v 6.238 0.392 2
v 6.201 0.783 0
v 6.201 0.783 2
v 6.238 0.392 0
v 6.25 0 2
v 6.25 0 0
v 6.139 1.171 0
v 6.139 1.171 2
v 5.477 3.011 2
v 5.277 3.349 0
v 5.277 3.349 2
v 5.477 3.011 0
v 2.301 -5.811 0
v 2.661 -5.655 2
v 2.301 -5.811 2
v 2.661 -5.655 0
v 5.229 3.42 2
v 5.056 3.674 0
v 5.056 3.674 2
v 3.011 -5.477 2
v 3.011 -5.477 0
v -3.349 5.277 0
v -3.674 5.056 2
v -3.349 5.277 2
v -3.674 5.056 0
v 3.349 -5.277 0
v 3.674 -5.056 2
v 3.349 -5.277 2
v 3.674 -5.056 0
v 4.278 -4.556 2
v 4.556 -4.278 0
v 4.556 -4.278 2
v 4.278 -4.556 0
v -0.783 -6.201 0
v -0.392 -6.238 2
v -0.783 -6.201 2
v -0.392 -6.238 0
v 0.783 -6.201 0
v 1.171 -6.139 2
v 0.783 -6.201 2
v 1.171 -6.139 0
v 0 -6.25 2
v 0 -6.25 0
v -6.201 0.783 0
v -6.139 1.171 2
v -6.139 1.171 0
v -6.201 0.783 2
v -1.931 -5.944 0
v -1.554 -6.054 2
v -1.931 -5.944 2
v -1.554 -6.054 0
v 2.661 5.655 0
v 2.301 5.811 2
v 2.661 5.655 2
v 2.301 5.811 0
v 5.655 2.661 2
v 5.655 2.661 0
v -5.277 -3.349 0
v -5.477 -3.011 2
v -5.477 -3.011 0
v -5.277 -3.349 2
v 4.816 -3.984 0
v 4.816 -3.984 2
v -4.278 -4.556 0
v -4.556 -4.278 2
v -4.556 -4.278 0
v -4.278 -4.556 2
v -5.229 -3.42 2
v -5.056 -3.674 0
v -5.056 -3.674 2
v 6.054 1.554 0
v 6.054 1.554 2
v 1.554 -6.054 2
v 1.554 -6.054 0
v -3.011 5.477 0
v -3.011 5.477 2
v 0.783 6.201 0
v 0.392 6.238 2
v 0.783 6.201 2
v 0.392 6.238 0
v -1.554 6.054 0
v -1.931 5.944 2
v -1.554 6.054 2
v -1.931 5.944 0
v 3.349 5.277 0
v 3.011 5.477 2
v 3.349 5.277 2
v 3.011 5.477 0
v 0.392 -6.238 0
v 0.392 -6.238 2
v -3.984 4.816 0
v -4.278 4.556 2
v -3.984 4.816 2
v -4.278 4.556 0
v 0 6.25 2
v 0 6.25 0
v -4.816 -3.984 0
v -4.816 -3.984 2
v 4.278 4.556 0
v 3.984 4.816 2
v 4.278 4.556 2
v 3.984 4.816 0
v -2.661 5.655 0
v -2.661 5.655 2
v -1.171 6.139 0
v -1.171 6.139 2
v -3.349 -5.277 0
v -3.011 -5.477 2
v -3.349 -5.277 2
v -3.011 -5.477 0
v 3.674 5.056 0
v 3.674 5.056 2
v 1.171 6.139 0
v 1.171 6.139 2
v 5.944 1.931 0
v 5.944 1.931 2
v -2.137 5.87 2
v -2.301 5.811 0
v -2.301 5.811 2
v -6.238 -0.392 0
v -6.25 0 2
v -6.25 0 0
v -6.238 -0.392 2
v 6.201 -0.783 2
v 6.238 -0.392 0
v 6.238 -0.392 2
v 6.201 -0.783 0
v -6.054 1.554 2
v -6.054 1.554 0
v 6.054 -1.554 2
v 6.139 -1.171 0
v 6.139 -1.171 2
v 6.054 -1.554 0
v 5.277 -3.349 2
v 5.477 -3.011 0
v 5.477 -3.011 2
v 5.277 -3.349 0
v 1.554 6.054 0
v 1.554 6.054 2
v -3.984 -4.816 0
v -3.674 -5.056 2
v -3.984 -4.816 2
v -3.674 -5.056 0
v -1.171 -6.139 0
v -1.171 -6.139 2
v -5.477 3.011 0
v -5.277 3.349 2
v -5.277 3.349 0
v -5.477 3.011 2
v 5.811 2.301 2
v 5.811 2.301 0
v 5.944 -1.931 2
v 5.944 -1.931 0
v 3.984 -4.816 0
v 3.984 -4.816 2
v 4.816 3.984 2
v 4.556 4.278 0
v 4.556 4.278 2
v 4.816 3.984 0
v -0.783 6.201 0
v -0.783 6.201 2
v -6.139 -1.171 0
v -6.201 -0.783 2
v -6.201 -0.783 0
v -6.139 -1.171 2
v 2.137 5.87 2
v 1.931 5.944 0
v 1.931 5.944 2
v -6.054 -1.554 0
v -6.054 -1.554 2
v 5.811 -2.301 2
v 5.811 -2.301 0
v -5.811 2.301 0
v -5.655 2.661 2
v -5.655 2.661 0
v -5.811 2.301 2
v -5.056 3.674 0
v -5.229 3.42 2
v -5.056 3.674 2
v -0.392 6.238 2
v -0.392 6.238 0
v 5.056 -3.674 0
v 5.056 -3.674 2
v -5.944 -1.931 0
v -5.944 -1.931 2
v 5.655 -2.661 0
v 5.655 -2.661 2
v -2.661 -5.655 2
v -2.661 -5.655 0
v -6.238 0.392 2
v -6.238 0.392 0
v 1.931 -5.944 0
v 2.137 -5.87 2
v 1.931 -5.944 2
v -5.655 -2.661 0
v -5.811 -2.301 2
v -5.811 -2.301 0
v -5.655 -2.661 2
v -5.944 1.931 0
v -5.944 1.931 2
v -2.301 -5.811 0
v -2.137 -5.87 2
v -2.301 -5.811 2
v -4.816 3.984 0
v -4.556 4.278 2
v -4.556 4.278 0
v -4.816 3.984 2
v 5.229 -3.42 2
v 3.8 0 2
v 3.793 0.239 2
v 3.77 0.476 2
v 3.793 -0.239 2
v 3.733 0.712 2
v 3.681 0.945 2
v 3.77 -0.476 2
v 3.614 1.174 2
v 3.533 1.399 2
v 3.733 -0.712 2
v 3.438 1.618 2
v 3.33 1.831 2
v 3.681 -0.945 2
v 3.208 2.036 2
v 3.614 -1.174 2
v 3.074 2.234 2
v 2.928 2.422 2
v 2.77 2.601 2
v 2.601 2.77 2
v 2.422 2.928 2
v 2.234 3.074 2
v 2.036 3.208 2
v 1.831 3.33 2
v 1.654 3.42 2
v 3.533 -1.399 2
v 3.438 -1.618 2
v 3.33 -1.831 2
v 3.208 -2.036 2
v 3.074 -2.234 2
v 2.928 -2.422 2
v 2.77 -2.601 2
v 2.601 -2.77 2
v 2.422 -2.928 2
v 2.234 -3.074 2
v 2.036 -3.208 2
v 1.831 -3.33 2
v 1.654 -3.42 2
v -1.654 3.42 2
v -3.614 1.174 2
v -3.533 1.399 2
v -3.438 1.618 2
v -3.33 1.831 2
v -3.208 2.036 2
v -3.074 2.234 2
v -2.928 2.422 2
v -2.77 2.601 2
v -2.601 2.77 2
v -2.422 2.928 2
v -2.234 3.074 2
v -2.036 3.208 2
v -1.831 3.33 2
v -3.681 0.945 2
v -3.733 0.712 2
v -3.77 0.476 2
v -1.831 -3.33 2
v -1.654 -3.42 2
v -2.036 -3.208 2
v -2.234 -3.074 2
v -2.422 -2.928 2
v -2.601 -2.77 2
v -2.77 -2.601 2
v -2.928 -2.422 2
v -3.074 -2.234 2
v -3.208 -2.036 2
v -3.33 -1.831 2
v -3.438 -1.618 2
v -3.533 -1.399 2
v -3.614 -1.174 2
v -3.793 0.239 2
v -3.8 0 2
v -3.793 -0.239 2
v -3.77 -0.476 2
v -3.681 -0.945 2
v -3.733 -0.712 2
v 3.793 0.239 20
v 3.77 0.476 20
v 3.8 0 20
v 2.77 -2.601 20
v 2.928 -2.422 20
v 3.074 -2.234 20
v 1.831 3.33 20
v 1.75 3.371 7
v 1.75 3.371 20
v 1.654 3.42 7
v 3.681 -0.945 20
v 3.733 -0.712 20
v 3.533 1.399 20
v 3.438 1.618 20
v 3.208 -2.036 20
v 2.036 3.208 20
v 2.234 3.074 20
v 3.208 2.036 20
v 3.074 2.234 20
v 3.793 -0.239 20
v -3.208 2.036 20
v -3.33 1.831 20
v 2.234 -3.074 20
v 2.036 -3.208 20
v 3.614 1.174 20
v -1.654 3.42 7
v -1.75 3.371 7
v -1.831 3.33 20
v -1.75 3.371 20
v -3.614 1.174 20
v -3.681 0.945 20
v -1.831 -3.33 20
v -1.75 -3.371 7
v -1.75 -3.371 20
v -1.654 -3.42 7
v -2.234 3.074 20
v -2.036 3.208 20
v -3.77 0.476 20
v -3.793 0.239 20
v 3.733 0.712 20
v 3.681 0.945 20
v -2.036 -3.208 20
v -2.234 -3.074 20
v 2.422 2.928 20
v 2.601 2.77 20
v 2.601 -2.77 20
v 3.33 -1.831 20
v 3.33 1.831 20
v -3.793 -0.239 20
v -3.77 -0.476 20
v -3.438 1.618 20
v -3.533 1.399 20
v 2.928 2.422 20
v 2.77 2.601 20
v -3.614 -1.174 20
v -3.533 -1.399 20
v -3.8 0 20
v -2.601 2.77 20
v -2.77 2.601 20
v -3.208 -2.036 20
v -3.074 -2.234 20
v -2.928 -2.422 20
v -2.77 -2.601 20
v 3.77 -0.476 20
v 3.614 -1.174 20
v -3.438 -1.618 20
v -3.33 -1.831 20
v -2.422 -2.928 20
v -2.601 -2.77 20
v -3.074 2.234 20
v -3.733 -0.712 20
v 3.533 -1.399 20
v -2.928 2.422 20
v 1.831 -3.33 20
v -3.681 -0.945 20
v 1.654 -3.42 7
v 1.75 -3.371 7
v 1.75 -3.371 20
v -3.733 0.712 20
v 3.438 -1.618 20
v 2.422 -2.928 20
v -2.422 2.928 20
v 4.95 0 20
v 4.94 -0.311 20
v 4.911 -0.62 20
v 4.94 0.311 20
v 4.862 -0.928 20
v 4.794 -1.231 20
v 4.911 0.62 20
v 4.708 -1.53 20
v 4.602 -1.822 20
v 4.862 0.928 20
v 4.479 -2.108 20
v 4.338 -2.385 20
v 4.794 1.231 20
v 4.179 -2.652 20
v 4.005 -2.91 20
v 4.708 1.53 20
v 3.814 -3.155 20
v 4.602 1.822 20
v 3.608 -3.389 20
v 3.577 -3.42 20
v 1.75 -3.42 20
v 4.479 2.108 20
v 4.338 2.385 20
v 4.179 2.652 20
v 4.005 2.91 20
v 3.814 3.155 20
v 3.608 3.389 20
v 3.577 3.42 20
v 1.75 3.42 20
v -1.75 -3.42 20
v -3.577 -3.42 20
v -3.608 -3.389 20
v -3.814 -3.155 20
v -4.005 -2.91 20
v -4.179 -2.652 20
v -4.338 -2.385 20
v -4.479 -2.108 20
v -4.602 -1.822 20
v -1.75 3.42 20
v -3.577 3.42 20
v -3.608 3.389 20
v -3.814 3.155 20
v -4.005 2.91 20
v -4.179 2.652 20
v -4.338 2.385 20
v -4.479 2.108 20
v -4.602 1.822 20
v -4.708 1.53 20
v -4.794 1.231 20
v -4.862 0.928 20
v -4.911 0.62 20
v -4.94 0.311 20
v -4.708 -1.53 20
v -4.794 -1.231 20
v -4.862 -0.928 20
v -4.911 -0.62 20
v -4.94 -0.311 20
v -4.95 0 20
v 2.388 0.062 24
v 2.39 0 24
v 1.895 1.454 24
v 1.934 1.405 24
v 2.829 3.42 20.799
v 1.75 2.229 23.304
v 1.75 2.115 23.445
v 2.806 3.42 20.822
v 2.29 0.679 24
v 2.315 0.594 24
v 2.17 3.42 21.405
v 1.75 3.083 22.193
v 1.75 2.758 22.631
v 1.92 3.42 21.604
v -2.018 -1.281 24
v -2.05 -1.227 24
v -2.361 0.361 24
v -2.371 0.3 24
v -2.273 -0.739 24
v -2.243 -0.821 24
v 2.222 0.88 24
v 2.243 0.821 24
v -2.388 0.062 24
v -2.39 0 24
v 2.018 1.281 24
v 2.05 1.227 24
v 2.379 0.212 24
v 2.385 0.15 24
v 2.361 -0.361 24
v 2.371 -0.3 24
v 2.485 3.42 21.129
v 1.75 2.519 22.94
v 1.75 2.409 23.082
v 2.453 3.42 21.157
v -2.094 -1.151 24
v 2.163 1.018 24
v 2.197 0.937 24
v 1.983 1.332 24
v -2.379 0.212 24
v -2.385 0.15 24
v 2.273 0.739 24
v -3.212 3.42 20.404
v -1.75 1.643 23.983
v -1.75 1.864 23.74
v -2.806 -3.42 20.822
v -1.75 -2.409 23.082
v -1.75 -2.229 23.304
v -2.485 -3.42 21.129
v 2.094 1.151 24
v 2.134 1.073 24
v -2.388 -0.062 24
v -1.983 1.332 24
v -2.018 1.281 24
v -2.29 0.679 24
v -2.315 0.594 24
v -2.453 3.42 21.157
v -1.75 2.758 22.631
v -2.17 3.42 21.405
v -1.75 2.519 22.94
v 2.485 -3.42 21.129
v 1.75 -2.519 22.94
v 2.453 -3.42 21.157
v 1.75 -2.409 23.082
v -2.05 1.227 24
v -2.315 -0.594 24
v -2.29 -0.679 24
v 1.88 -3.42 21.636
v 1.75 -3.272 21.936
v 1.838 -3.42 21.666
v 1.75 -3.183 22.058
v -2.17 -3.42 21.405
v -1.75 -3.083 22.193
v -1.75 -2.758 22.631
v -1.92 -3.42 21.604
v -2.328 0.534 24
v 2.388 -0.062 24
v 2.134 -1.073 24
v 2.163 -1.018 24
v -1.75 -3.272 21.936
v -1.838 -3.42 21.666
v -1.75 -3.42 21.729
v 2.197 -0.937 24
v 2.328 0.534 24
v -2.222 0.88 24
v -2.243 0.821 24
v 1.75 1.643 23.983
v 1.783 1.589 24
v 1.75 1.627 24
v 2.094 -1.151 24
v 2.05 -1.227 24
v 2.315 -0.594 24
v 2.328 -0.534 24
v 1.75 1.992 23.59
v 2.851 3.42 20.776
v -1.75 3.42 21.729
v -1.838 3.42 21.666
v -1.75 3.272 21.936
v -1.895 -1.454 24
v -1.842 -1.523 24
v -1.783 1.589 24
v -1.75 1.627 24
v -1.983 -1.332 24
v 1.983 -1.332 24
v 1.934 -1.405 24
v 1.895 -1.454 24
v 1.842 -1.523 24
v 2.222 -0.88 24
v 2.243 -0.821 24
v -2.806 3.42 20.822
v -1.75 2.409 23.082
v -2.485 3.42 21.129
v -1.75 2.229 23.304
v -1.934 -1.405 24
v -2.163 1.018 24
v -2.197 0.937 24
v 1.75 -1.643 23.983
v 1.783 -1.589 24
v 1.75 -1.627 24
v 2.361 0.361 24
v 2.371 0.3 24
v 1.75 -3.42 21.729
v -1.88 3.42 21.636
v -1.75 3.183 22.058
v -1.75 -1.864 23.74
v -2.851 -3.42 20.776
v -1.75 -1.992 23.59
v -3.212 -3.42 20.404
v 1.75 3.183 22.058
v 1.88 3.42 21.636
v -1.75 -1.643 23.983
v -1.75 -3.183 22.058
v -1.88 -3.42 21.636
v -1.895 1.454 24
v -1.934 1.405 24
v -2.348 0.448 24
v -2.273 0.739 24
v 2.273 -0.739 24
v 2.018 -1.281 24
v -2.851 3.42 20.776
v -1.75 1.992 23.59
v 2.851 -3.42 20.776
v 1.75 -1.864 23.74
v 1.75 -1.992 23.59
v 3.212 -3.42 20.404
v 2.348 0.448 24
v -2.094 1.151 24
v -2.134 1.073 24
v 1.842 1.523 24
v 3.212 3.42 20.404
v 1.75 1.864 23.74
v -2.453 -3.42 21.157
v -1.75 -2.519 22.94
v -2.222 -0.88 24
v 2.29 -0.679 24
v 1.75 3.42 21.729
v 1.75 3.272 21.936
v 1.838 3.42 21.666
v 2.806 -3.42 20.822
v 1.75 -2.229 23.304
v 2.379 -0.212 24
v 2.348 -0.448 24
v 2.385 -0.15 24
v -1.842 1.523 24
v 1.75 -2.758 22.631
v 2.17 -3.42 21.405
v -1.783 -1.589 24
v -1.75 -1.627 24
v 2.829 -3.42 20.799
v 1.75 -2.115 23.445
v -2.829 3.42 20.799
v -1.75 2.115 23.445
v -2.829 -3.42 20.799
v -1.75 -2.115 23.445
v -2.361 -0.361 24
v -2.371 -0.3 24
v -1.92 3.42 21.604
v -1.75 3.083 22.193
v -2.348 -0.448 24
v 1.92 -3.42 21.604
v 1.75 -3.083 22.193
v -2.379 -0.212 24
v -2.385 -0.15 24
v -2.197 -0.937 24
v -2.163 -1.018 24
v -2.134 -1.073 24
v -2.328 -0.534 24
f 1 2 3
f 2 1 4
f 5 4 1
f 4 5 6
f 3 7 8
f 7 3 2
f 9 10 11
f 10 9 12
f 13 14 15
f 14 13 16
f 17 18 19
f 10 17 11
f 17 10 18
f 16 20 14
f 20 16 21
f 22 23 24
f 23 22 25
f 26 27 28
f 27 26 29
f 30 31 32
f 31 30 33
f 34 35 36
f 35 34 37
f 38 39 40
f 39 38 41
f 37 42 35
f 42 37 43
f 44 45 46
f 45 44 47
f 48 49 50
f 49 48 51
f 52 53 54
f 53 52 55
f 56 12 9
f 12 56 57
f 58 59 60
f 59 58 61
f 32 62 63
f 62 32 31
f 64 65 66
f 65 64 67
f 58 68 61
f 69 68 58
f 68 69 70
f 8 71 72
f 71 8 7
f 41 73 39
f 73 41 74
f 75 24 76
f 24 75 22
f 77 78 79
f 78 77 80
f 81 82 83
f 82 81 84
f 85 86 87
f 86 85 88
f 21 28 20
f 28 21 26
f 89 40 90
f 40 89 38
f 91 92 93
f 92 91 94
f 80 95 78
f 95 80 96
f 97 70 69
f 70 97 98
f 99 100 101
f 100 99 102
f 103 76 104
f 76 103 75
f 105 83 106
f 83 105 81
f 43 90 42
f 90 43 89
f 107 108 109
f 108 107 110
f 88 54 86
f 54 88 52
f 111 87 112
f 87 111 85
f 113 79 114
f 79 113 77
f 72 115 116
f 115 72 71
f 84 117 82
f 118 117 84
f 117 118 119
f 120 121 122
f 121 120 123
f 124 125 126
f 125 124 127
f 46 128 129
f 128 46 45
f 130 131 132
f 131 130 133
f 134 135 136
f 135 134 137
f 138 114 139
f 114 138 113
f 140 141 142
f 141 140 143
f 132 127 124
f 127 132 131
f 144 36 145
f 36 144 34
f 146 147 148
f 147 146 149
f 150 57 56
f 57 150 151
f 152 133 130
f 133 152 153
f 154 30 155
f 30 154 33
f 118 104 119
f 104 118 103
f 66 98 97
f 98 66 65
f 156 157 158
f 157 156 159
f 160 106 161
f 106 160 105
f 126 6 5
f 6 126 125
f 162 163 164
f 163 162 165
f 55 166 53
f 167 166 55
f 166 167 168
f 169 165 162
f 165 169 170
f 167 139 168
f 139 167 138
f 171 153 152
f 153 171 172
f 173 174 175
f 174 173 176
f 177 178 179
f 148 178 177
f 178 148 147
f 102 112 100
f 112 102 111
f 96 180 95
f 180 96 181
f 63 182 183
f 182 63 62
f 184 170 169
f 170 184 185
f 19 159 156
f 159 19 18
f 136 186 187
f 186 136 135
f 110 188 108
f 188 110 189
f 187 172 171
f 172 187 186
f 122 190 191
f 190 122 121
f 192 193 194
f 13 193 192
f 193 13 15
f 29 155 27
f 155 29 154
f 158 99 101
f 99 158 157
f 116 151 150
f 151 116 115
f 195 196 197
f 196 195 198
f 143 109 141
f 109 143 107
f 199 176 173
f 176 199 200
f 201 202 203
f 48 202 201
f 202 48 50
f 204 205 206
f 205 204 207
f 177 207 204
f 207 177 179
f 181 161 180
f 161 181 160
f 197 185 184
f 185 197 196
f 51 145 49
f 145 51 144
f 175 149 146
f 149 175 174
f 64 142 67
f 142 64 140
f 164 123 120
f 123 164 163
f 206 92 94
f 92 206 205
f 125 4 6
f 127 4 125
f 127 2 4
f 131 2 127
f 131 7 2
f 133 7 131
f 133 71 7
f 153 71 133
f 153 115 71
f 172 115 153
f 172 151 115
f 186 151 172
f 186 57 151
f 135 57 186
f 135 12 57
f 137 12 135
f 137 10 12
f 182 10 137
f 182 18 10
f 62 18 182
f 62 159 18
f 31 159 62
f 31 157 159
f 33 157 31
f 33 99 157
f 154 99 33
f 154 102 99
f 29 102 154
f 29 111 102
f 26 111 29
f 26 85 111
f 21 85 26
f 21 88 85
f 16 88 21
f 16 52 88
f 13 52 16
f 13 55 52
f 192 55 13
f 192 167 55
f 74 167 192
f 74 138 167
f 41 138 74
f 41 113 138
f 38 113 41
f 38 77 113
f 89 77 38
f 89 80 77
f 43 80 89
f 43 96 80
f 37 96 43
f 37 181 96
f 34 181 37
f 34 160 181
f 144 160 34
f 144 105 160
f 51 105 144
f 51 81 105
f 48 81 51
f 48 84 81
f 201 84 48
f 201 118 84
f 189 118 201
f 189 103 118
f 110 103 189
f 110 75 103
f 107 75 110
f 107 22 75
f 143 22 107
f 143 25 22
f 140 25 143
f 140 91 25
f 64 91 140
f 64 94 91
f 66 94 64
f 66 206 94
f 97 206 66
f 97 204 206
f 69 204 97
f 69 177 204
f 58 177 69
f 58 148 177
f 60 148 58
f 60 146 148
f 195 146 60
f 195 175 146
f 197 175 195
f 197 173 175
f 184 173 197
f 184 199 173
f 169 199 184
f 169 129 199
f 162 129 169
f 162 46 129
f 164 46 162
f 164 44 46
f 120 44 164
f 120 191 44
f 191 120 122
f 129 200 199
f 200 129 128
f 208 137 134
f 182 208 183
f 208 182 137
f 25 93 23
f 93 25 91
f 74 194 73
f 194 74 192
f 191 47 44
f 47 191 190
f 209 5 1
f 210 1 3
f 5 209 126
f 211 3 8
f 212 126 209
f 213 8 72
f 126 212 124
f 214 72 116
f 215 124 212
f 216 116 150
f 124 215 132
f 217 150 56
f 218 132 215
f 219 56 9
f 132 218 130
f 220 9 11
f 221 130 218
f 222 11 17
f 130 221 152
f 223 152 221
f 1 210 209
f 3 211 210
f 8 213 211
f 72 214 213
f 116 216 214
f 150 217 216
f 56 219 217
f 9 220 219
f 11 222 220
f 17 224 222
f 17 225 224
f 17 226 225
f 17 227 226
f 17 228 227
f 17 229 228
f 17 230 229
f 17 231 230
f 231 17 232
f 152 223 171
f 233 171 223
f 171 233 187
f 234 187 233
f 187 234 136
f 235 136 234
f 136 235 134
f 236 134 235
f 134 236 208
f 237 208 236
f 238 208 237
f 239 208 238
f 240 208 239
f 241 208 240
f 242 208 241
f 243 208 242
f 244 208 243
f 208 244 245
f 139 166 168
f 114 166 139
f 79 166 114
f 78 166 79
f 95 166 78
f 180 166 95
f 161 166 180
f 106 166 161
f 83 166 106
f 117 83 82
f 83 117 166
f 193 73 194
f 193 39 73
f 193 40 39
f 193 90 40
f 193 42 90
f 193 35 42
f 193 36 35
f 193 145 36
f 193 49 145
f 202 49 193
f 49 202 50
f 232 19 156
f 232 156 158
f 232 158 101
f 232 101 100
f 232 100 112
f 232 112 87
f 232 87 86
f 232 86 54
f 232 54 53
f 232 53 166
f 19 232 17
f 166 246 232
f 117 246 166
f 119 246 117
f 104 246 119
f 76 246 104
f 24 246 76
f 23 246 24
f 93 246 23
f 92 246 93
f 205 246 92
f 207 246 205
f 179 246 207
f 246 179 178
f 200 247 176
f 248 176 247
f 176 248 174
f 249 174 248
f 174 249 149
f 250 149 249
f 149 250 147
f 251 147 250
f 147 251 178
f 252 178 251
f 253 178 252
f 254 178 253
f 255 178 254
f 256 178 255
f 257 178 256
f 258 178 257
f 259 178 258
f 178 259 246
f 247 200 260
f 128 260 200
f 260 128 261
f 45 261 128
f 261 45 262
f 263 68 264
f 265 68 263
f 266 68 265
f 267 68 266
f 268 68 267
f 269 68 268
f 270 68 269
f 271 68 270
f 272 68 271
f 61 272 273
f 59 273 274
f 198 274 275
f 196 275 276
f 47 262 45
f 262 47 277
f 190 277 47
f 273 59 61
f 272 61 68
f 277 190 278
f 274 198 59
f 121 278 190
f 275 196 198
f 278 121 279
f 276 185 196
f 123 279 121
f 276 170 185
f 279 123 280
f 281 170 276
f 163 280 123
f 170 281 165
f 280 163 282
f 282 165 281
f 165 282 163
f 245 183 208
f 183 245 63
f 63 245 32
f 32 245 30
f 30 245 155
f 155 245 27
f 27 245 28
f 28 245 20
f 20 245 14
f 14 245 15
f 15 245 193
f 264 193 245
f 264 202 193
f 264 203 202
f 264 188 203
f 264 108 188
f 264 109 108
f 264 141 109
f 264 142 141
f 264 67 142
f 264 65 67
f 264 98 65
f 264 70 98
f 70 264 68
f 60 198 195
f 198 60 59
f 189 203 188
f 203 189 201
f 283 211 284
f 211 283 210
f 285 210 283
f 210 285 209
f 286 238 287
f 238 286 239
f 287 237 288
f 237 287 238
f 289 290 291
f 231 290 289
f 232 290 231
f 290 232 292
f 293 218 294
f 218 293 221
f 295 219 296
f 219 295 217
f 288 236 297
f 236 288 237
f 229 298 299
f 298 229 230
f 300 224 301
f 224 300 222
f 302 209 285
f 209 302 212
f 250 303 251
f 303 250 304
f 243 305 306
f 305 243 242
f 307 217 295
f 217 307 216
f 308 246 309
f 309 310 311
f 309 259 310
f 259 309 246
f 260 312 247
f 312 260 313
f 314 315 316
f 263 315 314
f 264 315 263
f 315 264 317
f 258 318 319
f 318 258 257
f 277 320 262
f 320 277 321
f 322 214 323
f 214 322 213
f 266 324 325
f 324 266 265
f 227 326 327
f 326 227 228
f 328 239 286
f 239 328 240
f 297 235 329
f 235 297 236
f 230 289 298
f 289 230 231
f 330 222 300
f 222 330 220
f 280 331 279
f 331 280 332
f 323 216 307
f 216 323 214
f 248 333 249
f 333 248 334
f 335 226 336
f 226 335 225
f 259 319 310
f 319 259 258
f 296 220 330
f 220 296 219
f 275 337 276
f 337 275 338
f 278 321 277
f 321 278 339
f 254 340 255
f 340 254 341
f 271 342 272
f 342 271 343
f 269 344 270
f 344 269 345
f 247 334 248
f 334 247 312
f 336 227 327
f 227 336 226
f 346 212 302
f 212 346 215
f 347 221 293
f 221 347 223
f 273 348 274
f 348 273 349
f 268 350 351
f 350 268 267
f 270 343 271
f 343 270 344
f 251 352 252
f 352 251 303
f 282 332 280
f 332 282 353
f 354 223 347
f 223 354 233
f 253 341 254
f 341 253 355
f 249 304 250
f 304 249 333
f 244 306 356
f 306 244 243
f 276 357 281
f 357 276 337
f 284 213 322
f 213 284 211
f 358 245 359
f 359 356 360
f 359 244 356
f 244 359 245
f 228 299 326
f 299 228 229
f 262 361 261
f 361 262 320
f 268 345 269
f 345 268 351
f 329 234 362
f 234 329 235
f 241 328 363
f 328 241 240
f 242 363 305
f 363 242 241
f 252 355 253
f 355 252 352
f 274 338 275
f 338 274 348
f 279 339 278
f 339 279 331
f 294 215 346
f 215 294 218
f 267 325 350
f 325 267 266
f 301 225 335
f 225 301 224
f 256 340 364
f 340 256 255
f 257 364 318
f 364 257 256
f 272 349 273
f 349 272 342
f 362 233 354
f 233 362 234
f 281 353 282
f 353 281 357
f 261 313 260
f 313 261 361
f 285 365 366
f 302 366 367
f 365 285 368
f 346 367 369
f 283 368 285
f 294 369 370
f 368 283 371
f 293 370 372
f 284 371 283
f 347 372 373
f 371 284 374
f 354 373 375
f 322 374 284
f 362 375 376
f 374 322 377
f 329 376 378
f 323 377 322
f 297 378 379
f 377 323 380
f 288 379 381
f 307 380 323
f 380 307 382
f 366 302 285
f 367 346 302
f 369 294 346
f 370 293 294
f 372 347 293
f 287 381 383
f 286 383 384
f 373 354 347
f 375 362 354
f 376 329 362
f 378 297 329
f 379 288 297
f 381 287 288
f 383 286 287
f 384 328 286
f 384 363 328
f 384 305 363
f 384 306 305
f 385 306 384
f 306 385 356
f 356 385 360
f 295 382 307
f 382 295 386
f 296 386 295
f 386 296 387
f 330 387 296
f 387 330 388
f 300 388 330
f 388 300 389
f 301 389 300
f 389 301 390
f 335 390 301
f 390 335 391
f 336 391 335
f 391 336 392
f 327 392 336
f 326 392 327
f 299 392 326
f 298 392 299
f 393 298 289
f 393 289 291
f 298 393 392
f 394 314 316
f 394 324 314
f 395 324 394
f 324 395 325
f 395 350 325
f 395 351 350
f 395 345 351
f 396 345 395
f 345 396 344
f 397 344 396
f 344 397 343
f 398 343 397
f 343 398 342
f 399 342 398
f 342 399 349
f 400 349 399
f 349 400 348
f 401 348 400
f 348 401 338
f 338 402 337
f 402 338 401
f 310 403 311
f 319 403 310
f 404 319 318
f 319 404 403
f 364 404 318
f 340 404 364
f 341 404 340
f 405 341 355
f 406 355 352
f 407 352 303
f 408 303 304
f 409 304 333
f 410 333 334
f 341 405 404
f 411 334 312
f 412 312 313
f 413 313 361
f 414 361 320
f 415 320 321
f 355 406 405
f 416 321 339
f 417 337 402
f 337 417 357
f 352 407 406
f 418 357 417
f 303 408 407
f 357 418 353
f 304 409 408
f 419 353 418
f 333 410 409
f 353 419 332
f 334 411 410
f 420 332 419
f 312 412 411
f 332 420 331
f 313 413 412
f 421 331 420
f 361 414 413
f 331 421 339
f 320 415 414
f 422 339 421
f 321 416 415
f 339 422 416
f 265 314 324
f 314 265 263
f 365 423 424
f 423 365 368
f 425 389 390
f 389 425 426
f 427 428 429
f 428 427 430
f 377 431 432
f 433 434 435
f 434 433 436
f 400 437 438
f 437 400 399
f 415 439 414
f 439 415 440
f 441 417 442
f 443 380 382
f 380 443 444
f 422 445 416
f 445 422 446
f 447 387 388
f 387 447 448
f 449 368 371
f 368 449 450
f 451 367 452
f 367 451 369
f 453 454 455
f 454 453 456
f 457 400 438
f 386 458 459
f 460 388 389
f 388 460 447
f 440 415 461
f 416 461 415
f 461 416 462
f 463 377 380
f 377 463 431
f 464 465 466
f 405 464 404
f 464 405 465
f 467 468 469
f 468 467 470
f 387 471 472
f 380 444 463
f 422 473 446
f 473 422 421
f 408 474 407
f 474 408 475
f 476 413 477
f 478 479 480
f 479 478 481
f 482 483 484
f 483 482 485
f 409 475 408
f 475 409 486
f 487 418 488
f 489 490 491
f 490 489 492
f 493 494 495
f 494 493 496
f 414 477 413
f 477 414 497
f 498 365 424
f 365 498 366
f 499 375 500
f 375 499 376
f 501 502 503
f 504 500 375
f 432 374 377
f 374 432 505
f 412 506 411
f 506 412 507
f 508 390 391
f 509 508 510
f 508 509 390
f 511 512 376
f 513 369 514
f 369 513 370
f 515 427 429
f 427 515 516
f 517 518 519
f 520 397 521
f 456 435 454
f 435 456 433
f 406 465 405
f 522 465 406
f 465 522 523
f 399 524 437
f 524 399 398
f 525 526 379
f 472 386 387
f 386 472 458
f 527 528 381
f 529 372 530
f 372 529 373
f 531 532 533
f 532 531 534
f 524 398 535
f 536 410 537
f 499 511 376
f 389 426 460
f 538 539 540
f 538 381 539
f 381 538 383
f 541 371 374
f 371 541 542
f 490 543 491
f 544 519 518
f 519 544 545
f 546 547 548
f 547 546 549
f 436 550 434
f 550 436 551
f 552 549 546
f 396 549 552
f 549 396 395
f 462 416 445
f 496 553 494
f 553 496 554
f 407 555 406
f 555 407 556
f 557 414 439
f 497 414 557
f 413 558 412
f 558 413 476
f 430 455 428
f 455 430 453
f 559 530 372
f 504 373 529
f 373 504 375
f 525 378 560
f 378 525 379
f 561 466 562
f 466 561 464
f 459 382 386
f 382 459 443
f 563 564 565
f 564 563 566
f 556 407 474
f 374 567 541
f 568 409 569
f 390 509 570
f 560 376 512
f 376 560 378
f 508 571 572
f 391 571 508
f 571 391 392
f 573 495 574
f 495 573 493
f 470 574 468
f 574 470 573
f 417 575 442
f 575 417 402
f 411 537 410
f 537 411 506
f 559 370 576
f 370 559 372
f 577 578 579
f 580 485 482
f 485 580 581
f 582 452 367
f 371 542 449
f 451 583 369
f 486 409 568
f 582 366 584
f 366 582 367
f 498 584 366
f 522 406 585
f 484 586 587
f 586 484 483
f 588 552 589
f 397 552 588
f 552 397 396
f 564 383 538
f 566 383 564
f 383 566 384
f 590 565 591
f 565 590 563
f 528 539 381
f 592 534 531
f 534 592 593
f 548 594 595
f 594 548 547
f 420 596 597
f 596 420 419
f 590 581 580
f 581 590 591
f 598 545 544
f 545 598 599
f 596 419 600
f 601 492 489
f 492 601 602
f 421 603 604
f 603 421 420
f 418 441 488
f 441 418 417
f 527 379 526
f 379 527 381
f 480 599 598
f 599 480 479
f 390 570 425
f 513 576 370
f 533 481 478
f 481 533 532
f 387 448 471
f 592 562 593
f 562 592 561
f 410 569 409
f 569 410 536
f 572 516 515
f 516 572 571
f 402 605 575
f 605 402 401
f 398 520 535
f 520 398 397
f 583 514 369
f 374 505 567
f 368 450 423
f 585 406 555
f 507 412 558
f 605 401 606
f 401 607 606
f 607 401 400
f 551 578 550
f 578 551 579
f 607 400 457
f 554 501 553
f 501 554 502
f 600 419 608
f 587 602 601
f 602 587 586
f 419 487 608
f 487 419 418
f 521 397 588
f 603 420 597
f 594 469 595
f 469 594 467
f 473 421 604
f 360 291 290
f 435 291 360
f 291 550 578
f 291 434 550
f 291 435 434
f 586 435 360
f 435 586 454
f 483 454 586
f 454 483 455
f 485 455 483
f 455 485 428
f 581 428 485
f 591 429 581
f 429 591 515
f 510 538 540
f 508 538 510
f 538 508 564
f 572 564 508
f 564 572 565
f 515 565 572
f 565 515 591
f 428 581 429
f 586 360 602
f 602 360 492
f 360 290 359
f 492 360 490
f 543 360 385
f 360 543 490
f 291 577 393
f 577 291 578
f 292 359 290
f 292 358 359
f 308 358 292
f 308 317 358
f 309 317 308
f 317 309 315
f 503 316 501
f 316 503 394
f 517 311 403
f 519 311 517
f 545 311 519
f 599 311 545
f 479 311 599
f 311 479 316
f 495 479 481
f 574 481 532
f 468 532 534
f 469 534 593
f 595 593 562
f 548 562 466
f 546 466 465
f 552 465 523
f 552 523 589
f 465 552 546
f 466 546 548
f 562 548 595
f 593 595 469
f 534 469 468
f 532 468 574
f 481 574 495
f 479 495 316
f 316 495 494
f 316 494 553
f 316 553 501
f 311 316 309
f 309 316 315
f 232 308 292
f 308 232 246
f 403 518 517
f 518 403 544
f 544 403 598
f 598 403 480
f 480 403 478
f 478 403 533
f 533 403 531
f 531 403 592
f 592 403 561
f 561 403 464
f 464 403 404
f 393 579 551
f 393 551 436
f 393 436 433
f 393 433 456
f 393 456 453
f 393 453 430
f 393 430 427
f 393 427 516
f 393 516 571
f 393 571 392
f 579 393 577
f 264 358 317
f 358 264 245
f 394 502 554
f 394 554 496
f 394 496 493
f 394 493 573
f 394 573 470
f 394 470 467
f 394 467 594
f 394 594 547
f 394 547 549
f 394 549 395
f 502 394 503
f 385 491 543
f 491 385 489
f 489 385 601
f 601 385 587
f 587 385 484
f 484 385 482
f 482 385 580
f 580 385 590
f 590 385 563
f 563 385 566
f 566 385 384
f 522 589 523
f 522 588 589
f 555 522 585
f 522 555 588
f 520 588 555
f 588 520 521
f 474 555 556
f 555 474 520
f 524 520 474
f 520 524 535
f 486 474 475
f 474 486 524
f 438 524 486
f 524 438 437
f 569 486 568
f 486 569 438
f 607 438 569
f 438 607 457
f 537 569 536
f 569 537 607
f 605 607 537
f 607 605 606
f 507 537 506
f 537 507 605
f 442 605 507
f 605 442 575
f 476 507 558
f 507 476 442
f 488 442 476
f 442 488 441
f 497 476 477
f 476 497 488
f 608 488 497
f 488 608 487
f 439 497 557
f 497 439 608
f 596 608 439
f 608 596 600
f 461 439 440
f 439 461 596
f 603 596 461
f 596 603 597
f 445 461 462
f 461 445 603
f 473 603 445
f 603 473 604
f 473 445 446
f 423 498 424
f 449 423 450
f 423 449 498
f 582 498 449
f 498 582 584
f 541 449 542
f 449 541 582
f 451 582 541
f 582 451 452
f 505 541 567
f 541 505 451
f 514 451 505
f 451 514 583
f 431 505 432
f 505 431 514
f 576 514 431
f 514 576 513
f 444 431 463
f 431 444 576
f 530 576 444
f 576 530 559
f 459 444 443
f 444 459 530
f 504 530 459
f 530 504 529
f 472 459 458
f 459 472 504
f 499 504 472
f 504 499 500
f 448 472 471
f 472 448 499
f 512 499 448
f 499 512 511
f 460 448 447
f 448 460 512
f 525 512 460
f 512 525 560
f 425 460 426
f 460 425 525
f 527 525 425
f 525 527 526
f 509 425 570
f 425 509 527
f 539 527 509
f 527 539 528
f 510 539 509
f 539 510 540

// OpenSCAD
// Render objects
clip  = 1;
brace = 0;

// Global Parameters
precision             = 100;
tolerance             = 0.3;

// Brace
brace_height          = 7.7;
brace_length          = 115;
brace_width           = 13.65;
brace_thickness       = 1.5;

// Posts
post_outer_diameter   = 11.95 - tolerance;
post_inner_diameter   = 8.0   + tolerance;
post_height           = 20.95;
post_recess_height    = 5;

// Clip
clip_length           = 25.0;
clip_cap_diameter     = 12.5; // 2 types 12.5 and 14.0
clip_cap_thickness    = 2;
clip_inner_diameter   = 7.9 - tolerance; // =~ post_inner_diameter
clip_inner_gap        = 3.5;
clip_gap_length       = 7.0; // 10.2
clip_gap_thickness    = 1.8;
clip_bellend_length   = 5.0;
clip_bellend_diameter = 9.9; // 2mm greater than inner_diameter

module brace() {

    difference() {

        // Things that exist
        union() {
            curved_rectangle( brace_width, brace_length, brace_height );
            translate( v = [brace_width/2, brace_width/2, 0] ) cylinder( r = post_outer_diameter/2, h = post_height, $fn = precision );
            translate( v = [brace_width/2, brace_length - brace_width/2, 0] ) cylinder( r = post_outer_diameter/2, h = post_height, $fn = precision );
        }

        // Things that don't exist
        union() {
            translate( v = [ brace_thickness, brace_thickness + brace_width, brace_thickness ] )
                curved_rectangle( brace_width - brace_thickness * 2, brace_length - brace_thickness *2 - brace_width*2, brace_height - brace_thickness );

            // Posts
            translate( v = [brace_width/2, brace_width/2, 0] ) cylinder( r = post_inner_diameter/2, h = post_height, $fn = precision );
            translate( v = [brace_width/2, brace_length - brace_width/2, 0] ) cylinder( r = post_inner_diameter/2, h = post_height, $fn = precision );

            // Recess
            translate( v = [brace_width/2, brace_width/2, 0] ) cylinder( r1 = post_outer_diameter/2, r2 = clip_bellend_diameter/2, h = post_recess_height, $fn = precision );
            translate( v = [brace_width/2, brace_length - brace_width/2, 0] ) cylinder( r1 = post_outer_diameter/2, r2 = clip_bellend_diameter/2, h = post_recess_height, $fn = precision );
        }
    
    }

}

module curved_rectangle(w,l,h) {

    translate( v = [0, w/2, 0] )
    union() {

        // Basic shape
        cube( size = [w, l-w, h]);
        translate( v = [w/2, 0, 0] ) cylinder( h = h, r = w/2, $fn = precision );
        translate( v = [w/2, l-w, 0] ) cylinder( h = h, r = w/2, $fn = precision );

    }

}

module clip() {

    difference() {

        // Things that exist
        union() {
            cylinder( r = clip_cap_diameter/2, clip_cap_thickness, $fn = precision);
            cylinder( r = clip_inner_diameter/2, clip_length - clip_bellend_length, $fn = precision);
            translate( v = [0, 0, clip_length - clip_bellend_length] )
                cylinder( r1 = clip_bellend_diameter/2, r2 = clip_inner_gap/2, clip_bellend_length, $fn = precision);
        }

        // Things to be cut out
        union() {
            // Gap between clip
            translate( v = [-clip_inner_gap/2, -clip_cap_diameter/2, clip_gap_length] ) {
                cube( size = [clip_inner_gap, clip_cap_diameter, clip_length] );
            }

            // Remove edges of bellend
            translate( v = [-clip_cap_diameter/2, clip_inner_diameter * 0.45, clip_cap_thickness] ) {
                cube( size = [clip_cap_diameter, (clip_cap_diameter - clip_inner_diameter)/2, clip_length] );
            }
            translate( v = [-clip_cap_diameter/2, -clip_inner_diameter * 0.45 - (clip_cap_diameter - clip_inner_diameter)/2, clip_cap_thickness] ) {
                cube( size = [clip_cap_diameter, (clip_cap_diameter - clip_inner_diameter)/2, clip_length] );
            }

            // Remove top edge of bellend
            translate( v = [-clip_cap_diameter/2, -clip_cap_diameter/2, clip_length - (0.2 * clip_bellend_length)] ) {
                cube( size = [clip_cap_diameter, clip_cap_diameter, 5] );
            }

        }
    }

}

if (clip == 1) {
    clip();
}
if (brace == 1) {
    brace();
}
